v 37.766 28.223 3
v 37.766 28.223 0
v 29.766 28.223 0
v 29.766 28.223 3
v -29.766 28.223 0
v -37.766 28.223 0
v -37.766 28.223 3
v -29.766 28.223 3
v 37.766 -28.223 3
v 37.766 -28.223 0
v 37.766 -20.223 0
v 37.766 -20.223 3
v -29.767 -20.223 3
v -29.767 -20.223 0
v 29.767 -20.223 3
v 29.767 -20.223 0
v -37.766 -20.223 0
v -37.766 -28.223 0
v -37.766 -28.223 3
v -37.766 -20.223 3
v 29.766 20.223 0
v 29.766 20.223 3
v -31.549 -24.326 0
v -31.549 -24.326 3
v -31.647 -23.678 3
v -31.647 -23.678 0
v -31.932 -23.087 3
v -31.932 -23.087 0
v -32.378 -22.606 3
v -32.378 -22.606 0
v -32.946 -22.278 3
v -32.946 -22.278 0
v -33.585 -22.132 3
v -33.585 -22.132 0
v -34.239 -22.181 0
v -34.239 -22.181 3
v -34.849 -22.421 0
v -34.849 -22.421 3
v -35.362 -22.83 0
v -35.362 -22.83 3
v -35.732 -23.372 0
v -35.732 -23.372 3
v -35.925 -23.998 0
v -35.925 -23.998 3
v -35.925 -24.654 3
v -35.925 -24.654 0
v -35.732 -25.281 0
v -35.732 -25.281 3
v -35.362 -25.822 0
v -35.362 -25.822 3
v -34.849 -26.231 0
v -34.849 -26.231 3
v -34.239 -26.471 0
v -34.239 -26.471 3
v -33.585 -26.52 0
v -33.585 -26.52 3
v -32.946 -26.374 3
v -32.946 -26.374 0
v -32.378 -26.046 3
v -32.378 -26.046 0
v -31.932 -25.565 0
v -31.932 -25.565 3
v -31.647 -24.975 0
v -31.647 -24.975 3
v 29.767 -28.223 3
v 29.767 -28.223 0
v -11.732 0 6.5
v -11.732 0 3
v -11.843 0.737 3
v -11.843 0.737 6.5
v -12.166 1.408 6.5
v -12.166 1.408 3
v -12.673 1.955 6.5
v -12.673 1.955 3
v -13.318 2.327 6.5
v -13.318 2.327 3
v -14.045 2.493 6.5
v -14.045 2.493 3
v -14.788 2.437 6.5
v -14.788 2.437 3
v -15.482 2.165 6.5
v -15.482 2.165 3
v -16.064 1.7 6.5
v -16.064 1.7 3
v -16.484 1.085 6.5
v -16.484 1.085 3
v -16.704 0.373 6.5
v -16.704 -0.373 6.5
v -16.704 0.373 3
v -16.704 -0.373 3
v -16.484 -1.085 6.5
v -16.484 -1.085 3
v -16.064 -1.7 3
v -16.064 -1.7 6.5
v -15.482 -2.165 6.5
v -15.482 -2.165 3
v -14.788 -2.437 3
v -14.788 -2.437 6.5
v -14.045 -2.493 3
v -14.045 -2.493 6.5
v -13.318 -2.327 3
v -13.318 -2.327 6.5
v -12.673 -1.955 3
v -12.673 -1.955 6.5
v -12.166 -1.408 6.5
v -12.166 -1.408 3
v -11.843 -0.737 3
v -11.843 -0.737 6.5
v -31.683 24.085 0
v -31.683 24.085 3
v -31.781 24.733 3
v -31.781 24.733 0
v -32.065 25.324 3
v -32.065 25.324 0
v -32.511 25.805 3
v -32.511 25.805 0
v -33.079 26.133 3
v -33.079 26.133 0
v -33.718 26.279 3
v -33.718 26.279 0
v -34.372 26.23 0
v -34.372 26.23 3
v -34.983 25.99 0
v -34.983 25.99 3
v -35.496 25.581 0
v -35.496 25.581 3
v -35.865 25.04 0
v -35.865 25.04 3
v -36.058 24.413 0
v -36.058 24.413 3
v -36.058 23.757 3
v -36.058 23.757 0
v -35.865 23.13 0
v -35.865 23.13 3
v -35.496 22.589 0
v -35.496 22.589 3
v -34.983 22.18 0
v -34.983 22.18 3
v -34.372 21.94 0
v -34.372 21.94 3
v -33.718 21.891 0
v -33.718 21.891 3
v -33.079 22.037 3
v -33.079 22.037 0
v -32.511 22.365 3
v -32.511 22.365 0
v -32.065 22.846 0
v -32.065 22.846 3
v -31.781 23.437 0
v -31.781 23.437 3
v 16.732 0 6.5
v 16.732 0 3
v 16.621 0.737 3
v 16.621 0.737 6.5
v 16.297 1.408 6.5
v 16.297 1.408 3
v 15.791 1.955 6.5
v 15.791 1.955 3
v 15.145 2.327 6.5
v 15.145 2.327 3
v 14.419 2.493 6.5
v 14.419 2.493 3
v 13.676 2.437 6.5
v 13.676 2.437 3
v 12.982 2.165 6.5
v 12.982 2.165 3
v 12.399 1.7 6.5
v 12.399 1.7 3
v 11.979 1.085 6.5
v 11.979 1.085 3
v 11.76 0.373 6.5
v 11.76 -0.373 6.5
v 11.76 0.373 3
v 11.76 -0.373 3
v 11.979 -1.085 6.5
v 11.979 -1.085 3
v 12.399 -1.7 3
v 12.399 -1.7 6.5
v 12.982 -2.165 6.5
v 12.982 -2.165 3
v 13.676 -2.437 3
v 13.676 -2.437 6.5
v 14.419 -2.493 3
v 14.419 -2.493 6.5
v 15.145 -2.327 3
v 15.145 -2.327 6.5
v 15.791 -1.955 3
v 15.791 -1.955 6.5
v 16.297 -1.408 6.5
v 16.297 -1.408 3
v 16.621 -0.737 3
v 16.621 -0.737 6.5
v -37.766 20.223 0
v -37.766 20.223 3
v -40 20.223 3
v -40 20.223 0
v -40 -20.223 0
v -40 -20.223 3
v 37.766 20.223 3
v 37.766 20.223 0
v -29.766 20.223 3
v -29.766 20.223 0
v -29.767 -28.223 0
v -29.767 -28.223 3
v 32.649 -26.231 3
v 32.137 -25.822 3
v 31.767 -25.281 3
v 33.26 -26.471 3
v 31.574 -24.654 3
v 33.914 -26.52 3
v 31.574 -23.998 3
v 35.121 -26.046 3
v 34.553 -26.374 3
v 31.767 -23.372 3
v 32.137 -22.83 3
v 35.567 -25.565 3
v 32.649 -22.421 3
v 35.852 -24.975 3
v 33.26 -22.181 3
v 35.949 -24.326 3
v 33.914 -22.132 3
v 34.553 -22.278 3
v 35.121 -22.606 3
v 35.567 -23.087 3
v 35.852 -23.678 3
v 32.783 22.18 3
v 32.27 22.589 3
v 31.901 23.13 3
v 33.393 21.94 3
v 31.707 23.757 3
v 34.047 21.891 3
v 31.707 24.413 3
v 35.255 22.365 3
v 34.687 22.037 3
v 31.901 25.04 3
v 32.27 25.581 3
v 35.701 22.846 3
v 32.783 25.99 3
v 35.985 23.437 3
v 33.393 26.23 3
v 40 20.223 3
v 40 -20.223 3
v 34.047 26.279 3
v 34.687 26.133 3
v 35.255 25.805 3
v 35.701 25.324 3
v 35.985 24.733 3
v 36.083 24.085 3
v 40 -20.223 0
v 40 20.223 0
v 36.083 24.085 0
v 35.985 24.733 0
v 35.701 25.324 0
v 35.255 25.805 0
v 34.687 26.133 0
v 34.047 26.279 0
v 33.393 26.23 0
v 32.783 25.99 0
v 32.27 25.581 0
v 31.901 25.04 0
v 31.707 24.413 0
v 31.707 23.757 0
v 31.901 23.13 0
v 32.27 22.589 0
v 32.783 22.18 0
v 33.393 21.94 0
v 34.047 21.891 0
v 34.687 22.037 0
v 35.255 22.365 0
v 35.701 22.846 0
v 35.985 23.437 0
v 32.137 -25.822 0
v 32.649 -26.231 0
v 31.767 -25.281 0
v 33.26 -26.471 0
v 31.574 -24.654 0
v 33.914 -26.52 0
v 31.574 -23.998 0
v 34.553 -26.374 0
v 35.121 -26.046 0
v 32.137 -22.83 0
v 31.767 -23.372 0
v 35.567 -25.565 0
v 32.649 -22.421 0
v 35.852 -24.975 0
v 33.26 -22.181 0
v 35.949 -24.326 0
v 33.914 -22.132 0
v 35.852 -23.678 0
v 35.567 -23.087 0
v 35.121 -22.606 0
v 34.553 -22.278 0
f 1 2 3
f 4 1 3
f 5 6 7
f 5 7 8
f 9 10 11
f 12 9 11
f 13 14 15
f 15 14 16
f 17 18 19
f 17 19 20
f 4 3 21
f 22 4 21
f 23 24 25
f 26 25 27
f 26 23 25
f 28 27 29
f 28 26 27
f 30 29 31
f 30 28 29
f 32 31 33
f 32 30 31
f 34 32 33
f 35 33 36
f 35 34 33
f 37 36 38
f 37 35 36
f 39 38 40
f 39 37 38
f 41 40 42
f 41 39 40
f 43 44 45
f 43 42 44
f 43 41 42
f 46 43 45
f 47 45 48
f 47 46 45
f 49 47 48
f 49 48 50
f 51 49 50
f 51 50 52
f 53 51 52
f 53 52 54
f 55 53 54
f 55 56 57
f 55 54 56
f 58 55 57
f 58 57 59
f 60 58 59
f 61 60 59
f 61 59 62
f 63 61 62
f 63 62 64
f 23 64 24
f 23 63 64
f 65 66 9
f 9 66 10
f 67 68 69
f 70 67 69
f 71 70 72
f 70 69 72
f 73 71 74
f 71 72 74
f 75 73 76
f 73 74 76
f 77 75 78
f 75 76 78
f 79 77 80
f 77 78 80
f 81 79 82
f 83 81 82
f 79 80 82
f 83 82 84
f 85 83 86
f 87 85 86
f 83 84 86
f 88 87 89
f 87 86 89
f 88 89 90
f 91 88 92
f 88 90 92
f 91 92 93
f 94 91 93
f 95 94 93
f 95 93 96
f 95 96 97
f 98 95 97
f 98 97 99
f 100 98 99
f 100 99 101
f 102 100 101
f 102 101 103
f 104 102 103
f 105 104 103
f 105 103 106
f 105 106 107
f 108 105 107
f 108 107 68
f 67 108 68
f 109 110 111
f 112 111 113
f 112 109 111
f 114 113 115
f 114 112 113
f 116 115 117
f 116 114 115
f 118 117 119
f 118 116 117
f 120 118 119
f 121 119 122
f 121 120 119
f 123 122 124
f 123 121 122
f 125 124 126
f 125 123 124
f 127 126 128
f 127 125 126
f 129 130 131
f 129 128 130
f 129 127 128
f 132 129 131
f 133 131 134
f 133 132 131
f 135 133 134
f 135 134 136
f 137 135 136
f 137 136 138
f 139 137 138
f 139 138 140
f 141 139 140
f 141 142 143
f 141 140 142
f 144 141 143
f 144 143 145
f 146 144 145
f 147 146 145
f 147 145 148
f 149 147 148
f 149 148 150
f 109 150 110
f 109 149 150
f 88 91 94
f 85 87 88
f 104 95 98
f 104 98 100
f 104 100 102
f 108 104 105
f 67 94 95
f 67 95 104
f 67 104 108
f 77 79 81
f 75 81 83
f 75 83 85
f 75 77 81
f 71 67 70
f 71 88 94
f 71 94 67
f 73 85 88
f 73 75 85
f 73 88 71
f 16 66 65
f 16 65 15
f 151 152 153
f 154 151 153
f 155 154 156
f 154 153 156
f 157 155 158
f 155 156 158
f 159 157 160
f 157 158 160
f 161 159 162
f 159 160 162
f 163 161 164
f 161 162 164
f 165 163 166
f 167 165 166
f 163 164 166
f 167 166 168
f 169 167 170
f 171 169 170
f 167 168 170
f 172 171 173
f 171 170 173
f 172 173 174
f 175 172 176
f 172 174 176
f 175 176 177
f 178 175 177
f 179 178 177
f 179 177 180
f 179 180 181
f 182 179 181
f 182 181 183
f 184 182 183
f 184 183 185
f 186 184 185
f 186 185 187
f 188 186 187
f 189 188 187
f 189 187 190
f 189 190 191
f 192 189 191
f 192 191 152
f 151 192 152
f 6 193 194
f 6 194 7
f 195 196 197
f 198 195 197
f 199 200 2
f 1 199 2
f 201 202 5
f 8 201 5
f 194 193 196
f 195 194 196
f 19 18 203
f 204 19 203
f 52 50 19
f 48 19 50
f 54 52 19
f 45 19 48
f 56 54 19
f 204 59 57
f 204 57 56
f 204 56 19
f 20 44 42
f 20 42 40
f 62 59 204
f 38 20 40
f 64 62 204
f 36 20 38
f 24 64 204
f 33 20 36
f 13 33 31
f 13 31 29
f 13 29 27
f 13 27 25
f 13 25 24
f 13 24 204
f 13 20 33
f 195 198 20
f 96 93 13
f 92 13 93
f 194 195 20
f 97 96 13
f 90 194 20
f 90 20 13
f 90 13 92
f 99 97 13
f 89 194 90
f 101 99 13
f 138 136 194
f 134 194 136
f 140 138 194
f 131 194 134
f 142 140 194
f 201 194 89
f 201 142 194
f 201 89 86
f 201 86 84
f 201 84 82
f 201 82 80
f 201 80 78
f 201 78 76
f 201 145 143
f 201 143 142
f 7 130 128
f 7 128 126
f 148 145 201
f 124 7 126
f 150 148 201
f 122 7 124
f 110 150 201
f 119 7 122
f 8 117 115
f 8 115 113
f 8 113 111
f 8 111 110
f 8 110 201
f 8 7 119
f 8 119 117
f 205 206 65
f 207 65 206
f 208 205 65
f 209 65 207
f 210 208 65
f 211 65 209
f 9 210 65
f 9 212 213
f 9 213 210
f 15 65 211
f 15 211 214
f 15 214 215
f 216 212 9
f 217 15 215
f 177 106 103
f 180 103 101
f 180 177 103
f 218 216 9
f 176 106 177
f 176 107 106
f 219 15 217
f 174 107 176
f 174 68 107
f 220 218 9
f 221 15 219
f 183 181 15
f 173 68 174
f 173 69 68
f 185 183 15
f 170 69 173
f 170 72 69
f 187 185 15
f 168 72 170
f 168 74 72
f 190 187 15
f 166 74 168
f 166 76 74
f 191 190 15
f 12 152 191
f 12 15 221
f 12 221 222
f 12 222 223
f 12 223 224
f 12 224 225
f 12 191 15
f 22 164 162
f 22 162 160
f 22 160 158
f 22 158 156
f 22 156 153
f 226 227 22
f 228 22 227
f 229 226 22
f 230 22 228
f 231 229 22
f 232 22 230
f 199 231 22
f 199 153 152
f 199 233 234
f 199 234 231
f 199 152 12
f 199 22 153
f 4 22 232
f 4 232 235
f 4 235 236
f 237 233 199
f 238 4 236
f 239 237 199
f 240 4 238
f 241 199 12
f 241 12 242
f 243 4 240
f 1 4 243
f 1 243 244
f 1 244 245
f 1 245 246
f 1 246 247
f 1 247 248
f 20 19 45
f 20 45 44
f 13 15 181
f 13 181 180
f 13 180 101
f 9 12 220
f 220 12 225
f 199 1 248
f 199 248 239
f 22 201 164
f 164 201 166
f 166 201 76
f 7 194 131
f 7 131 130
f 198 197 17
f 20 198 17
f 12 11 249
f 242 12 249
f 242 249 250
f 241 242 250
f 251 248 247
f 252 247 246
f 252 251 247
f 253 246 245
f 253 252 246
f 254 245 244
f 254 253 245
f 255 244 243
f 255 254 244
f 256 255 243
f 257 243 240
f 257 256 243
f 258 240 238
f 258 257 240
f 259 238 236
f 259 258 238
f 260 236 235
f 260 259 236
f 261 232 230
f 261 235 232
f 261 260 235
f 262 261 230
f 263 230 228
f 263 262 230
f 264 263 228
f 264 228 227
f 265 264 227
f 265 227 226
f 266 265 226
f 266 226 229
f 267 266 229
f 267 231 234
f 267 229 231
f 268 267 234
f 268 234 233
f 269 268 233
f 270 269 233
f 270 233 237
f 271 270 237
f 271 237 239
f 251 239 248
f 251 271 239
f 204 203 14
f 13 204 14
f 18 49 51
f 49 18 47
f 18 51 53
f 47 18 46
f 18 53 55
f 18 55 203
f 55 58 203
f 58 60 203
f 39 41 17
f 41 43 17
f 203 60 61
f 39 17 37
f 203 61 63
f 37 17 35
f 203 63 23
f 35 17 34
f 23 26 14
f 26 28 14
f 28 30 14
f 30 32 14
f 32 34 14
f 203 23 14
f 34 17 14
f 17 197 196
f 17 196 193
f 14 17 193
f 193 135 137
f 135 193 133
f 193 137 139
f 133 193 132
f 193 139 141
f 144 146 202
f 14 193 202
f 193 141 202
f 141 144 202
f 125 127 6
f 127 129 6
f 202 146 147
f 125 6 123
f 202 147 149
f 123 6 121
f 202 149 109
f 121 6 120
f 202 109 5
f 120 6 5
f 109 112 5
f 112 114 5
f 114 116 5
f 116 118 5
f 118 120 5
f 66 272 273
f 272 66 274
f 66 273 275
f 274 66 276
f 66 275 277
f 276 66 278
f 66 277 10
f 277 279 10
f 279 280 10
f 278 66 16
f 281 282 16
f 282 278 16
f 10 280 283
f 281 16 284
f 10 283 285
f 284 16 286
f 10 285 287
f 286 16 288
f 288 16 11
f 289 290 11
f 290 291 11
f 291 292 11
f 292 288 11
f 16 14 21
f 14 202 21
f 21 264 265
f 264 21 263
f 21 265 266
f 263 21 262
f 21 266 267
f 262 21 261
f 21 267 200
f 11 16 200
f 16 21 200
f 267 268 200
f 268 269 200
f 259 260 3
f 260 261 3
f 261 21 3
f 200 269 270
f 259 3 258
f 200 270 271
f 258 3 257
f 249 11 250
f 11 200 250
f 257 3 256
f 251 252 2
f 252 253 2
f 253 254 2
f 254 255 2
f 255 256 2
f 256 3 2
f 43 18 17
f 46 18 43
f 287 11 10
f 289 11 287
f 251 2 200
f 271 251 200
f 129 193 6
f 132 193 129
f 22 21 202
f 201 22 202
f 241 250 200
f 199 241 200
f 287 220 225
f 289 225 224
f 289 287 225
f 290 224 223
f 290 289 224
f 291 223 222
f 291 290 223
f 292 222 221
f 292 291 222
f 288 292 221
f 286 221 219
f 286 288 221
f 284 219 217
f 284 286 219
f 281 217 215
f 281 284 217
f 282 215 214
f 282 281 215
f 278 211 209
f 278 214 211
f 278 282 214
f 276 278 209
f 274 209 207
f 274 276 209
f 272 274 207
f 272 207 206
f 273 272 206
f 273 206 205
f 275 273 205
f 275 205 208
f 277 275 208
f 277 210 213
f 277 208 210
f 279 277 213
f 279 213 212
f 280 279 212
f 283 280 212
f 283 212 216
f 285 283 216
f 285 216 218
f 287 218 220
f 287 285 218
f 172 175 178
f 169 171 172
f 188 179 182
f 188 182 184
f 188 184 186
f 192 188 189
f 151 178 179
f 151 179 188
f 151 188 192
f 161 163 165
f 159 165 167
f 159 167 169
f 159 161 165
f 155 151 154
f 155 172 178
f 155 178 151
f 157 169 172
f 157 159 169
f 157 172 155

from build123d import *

# Parameters (mm, degrees)
F0_W     = 8
F0_H     = 8
F0_W_2   = 7.999141
F1_DEPTH = 3
F2_R     = 2.2
F3_DEPTH = 5
F4_R     = 2.5
F5_DEPTH = 6.5


with BuildPart() as f1:
    # F0 (on Top) → F1 (new body)
    with BuildSketch(Plane.XY):
        Polygon((-37.766442, 20.223286), (-40, 20.223286), (-40, -20.223286), (-37.766442, -20.223286), (-29.767301, -20.223286), (29.767301, -20.223286), (37.766442, -20.223286), (40, -20.223286), (40, 20.223286), (37.766442, 20.223286), (36.185599, 20.223286), (29.766442, 20.223286), (28.185599, 20.223286), (-29.766442, 20.223286), align=None)
        with Locations((-33.766442, 24.223286)):
            Rectangle(F0_W, F0_H)
        with Locations((-33.766872, -24.223286)):
            Rectangle(F0_W_2, F0_H)
        Polygon((29.766442, 28.223286), (29.766442, 20.223286), (36.185599, 20.223286), (37.766442, 20.223286), (37.766442, 28.223286), align=None)
        with Locations((33.766872, -24.223286)):
            Rectangle(F0_W_2, F0_H)
    extrude(amount=F1_DEPTH)

    # F2 (on Top) → F3 (cut)
    with BuildSketch(Plane.XY):
        with Locations((-33.882905, 24.085037)):
            Circle(F2_R)
        with Locations((-33.74939, -24.326075)):
            Circle(F2_R)
        with Locations((33.882905, 24.085037)):
            Circle(F2_R)
        with Locations((33.74939, -24.326075)):
            Circle(F2_R)
    extrude(amount=F3_DEPTH, mode=Mode.SUBTRACT)

    # F4 (on Top) → F5 (join)
    with BuildSketch(Plane.XY):
        with Locations((-14.231804, 0)):
            Circle(F4_R)
        with Locations((14.231804, 0)):
            Circle(F4_R)
    extrude(amount=F5_DEPTH)


solid = f1.part
